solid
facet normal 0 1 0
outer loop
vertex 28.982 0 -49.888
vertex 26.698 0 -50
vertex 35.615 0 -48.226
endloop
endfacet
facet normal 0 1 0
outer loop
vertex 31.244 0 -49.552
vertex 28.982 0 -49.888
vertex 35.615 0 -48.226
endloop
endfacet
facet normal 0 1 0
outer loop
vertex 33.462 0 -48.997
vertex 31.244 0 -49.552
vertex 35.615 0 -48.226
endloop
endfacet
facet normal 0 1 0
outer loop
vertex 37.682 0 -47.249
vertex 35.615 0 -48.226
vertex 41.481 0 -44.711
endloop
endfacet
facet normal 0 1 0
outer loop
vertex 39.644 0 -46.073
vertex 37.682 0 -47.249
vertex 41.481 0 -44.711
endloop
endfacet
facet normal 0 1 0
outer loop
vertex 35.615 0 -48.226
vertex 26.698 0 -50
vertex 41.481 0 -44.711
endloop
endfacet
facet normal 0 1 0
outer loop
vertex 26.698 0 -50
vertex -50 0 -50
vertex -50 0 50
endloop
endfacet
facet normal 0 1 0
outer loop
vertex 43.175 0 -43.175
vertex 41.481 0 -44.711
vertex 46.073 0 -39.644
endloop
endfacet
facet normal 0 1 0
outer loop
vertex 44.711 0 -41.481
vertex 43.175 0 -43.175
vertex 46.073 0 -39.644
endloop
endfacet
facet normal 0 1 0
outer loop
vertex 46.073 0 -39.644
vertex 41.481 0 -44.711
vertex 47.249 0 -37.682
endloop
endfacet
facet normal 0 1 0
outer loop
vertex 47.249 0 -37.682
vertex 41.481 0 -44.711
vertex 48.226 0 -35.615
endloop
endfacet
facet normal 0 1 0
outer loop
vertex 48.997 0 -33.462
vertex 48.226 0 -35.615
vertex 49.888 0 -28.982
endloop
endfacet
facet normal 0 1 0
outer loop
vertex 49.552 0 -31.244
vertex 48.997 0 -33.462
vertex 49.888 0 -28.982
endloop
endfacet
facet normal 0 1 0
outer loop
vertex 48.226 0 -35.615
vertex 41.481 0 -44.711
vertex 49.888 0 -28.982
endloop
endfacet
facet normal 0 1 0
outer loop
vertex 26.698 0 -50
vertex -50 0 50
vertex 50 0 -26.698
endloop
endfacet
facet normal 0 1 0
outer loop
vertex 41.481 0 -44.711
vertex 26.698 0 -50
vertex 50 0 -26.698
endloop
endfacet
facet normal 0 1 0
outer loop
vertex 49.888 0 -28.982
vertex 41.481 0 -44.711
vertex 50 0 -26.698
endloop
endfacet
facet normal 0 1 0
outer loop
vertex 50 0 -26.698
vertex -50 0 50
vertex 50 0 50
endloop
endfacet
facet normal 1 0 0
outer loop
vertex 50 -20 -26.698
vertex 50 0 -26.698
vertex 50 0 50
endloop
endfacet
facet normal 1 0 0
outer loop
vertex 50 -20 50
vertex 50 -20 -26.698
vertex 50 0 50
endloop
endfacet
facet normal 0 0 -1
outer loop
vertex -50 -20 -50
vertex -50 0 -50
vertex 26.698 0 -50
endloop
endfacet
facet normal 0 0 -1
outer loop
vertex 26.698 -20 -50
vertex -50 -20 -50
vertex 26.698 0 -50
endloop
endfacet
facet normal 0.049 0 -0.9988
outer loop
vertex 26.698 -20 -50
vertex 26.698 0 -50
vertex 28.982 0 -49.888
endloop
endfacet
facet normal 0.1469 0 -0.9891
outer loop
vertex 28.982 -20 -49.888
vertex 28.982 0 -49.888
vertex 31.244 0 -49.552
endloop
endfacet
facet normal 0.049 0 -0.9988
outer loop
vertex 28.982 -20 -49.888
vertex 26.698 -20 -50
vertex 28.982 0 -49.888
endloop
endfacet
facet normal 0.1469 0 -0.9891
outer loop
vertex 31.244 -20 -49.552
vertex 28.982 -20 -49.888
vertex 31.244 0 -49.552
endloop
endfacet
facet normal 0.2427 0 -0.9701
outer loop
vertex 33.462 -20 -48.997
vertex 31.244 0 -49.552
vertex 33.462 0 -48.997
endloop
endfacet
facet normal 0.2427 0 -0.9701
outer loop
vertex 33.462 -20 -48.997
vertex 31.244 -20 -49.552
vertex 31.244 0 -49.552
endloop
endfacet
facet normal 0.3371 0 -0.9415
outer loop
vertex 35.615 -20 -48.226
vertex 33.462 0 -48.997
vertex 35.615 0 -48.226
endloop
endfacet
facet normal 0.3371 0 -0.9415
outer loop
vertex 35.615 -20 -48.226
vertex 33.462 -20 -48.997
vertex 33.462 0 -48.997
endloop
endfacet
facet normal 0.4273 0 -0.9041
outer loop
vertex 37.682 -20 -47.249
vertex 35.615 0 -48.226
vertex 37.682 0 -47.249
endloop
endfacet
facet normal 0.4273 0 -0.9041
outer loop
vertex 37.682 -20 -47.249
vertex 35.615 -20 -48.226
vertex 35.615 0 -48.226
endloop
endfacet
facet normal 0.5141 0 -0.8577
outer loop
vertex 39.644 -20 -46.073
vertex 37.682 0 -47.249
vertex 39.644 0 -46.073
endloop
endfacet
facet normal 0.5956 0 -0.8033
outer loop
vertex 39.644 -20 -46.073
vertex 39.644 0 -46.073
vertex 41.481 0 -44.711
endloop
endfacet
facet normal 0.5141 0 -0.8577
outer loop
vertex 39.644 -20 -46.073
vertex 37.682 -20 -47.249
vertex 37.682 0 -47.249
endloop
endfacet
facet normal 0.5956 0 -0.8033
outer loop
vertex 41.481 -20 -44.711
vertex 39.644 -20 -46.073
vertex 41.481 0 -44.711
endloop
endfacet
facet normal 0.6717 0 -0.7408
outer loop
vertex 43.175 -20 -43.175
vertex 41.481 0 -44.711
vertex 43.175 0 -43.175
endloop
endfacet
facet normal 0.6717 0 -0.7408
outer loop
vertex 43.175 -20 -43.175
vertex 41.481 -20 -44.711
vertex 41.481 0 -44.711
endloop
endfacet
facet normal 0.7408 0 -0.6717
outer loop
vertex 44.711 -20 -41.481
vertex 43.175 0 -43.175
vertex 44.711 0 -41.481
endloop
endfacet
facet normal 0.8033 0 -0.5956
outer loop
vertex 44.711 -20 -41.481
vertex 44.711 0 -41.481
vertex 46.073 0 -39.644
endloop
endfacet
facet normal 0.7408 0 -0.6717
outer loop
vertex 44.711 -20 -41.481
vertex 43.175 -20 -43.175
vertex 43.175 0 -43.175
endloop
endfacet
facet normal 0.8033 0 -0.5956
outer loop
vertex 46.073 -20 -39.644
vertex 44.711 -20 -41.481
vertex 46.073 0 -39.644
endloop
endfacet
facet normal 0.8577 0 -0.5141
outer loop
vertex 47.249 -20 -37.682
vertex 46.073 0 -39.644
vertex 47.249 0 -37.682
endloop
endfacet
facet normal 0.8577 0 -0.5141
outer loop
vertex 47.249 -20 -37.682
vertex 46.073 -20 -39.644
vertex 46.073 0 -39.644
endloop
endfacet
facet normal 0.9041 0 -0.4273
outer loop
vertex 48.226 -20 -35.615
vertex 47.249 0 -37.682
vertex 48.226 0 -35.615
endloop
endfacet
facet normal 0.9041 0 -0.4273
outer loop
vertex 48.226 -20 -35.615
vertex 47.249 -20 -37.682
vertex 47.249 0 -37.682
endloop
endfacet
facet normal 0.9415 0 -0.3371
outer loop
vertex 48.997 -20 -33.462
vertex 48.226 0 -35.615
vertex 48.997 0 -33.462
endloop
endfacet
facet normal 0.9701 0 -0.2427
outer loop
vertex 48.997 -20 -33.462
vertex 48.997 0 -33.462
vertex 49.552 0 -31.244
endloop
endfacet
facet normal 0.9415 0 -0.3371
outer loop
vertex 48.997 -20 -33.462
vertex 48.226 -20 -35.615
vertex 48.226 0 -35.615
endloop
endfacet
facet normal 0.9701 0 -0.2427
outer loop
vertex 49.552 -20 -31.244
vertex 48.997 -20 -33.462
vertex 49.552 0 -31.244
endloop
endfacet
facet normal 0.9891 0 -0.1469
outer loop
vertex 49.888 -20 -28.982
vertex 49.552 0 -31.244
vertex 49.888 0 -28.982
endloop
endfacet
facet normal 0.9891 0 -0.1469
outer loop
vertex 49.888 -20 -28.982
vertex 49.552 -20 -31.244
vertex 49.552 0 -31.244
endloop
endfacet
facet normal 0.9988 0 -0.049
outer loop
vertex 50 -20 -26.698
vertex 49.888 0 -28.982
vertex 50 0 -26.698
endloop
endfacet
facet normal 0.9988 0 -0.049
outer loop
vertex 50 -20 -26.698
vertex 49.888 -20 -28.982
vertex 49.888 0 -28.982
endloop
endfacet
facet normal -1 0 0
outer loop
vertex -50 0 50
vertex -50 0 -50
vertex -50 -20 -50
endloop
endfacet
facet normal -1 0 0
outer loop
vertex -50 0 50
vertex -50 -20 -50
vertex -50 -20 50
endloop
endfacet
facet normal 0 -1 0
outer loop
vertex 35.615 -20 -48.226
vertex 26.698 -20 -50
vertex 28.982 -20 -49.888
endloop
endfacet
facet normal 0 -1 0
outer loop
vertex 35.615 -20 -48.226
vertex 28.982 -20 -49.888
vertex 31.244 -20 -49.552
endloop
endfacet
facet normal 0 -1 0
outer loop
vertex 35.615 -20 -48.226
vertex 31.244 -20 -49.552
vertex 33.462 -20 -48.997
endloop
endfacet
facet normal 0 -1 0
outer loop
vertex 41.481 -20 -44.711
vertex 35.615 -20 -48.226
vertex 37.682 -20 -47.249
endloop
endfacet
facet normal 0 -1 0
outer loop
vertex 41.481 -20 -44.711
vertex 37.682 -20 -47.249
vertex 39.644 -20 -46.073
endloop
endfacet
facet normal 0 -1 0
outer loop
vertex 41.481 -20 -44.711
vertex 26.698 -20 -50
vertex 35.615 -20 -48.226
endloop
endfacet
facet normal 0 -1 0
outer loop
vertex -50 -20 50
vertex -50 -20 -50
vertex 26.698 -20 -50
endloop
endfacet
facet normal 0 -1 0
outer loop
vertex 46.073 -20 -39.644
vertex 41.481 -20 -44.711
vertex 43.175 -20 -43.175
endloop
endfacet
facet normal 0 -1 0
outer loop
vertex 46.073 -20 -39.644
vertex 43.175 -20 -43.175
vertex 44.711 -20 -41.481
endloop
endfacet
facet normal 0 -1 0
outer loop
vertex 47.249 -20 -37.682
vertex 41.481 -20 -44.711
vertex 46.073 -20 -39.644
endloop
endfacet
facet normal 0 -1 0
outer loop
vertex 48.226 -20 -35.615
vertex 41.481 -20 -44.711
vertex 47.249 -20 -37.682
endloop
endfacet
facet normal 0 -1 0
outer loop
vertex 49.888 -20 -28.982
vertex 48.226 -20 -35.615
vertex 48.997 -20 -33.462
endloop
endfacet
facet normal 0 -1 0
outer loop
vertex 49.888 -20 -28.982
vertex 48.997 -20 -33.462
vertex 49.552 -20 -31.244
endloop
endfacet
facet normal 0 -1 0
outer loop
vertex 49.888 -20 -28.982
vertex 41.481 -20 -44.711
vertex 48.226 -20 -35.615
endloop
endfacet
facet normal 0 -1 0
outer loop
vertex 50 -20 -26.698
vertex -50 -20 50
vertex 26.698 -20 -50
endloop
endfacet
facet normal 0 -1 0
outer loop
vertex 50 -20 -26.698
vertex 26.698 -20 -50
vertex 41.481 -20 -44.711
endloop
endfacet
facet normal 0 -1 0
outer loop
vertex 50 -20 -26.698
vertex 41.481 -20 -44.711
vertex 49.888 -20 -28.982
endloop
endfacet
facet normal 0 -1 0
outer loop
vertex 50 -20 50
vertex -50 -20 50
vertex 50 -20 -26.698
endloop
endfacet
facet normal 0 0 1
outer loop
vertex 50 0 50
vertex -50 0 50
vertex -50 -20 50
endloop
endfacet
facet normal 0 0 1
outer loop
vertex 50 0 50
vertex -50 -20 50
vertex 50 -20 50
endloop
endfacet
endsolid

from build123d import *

# Parameters (mm, degrees)
F0_W     = 100
F0_H     = 100
F1_DEPTH = 20
F2_R     = 23.301989
F3_R     = 15.126454
F4_DEPTH = 20


with BuildPart() as f1:
    # F0 (on Front) → F1 (new body)
    with BuildSketch(Plane.XZ):
        Rectangle(F0_W, F0_H)
    extrude(amount=F1_DEPTH)

    # F2
    f2_edges = [f1.edges().sort_by_distance(p)[0] for p in [
        (50, -10, -50),
    ]]
    fillet(f2_edges, radius=F2_R)

    # F3 (on Front) → F4 (join)
    with BuildSketch(Plane.XZ):
        with Locations((24.664735, -23.76237)):
            Circle(F3_R)
    extrude(amount=F4_DEPTH)


solid = f1.part
